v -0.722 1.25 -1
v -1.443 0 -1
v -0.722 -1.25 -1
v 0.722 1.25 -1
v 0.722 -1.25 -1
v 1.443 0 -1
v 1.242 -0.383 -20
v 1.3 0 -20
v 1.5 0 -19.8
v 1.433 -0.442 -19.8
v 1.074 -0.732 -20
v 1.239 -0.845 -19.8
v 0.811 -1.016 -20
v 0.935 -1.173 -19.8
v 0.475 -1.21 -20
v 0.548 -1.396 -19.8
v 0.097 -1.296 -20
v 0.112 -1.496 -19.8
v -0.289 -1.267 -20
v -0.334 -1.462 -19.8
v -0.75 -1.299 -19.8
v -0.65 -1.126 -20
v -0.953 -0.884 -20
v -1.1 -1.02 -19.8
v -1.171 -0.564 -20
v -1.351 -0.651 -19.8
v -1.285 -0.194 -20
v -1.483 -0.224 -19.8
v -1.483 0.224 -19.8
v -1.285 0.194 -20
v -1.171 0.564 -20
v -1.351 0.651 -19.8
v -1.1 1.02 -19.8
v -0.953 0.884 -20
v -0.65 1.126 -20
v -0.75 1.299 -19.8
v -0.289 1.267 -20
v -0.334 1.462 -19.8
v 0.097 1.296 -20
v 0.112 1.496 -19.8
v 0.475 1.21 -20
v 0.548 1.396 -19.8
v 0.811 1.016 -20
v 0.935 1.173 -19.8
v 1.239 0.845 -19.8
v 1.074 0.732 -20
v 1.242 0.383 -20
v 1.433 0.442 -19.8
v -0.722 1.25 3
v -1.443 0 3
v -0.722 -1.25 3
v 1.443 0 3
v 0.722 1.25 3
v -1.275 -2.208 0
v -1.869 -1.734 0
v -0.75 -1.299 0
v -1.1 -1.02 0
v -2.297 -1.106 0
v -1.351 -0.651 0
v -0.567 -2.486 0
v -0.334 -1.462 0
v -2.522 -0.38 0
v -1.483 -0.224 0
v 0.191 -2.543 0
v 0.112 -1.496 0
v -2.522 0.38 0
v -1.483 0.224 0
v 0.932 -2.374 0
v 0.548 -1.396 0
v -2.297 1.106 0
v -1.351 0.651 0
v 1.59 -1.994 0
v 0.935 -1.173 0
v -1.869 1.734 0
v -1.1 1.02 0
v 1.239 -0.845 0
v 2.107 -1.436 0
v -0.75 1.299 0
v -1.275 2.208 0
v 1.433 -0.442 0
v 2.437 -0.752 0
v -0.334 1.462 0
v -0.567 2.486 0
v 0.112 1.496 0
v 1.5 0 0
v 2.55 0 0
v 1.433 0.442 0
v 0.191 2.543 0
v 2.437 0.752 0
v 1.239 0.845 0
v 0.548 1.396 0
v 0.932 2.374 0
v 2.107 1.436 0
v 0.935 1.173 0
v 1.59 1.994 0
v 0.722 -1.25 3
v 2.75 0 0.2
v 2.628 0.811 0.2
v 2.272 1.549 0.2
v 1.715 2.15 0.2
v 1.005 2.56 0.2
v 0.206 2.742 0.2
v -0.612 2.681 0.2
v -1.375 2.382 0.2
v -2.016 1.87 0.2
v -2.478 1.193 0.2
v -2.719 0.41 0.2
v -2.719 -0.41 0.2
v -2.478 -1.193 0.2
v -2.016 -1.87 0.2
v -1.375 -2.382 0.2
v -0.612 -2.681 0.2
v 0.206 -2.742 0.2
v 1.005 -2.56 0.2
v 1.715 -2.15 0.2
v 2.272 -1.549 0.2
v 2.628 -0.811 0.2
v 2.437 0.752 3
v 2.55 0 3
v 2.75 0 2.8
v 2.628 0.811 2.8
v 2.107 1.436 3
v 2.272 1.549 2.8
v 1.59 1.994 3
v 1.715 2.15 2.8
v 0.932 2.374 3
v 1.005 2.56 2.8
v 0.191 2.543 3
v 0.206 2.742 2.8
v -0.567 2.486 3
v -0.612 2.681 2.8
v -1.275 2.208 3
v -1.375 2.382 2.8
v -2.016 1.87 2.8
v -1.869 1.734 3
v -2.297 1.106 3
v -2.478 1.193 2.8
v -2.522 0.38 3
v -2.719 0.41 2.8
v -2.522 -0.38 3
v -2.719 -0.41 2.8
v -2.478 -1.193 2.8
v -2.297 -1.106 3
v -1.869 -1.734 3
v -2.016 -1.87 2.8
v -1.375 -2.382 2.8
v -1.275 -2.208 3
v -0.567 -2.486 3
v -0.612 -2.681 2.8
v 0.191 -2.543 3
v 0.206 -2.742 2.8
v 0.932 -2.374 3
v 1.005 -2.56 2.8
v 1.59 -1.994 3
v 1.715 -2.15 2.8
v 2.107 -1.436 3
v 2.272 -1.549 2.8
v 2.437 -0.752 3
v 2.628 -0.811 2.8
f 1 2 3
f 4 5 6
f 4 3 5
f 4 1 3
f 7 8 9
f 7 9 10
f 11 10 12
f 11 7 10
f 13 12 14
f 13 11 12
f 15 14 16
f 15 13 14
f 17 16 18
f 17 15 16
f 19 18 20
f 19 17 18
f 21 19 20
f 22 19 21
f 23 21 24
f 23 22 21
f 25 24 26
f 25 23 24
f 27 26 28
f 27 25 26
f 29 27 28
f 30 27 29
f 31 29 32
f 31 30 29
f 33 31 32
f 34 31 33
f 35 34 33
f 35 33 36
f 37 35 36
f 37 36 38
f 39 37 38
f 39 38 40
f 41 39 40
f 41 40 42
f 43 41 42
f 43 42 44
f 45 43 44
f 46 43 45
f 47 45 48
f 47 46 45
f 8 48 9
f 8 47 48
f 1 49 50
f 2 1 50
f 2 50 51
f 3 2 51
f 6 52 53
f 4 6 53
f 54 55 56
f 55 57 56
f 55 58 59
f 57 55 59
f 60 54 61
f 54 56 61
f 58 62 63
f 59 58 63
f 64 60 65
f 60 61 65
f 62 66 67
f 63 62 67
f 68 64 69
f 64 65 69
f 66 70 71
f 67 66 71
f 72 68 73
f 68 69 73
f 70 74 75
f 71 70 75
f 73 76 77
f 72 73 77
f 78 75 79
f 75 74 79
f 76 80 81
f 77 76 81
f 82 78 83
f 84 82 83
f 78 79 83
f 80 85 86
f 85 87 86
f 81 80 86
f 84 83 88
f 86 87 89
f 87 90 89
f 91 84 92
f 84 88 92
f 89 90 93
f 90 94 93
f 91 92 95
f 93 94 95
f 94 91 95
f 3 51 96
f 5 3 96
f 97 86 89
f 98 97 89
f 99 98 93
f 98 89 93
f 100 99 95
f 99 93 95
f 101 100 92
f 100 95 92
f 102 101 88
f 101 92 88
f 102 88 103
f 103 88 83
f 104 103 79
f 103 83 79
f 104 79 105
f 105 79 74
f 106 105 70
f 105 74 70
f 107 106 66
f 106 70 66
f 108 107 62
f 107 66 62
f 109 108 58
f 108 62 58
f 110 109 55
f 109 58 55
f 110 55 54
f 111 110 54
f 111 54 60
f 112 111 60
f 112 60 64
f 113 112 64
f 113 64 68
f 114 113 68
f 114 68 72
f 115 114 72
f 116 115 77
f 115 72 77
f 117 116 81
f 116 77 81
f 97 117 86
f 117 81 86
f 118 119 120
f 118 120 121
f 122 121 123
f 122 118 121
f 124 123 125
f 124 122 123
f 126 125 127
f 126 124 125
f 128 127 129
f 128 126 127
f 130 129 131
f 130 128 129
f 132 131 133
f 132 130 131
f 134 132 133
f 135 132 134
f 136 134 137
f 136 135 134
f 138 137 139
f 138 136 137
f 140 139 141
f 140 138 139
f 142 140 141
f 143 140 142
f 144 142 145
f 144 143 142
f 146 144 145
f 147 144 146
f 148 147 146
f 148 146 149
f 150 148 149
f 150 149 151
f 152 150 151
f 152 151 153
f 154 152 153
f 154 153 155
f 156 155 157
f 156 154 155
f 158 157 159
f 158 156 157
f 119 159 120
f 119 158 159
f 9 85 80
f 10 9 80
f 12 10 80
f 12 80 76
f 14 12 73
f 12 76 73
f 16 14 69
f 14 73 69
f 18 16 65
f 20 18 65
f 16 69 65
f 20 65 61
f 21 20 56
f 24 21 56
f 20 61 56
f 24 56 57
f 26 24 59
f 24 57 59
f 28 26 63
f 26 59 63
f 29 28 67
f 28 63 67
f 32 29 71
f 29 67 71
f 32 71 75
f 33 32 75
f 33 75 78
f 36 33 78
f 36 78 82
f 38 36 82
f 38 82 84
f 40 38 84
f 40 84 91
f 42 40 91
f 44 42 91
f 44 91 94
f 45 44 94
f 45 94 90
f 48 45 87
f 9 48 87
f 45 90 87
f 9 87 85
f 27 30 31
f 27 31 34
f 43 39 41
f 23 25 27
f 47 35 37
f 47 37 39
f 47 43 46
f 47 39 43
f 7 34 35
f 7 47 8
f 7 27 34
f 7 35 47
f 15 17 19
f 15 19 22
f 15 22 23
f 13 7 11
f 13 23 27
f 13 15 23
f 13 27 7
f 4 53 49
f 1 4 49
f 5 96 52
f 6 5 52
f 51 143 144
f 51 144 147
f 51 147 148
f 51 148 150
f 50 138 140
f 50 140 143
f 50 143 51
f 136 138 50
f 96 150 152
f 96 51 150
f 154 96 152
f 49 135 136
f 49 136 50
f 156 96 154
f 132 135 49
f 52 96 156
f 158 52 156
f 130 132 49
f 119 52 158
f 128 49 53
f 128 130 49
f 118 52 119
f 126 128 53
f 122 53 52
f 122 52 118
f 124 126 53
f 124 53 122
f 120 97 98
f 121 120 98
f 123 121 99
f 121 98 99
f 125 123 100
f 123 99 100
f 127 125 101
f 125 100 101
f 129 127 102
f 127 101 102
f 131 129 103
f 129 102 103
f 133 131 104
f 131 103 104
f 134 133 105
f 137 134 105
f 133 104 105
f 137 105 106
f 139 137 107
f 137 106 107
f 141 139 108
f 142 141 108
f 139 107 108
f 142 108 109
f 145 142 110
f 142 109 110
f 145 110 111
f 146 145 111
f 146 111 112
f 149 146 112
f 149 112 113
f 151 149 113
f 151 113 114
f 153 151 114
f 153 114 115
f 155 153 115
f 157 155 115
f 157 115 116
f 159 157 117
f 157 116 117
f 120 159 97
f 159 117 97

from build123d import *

# Parameters (mm, degrees)
SKETCH006_R     = 2.75
PAD003_DEPTH    = 3
SKETCH007_R     = 1.5
PAD004_DEPTH    = 20
POCKET002_DEPTH = 4
CHAMFER004_SIZE = 0.2


with BuildPart() as part:
    # Sketch006 → Pad003 (new body)
    with BuildSketch(Plane.XY):
        Circle(SKETCH006_R)
    extrude(amount=PAD003_DEPTH)

    # Sketch007 (on Face2 of Pad003) → Pad004 (join)
    with BuildSketch(Plane(origin=(0, 0, 0), x_dir=(1, 0, 0), z_dir=(0, 0, -1))):
        Circle(SKETCH007_R)
    extrude(amount=PAD004_DEPTH)

    # Sketch008 (on DatumPlane) → Pocket002 (cut)
    with BuildSketch(Plane.XY.offset(3)):
        Polygon((0.721688, -1.25), (1.443376, 0), (0.721688, 1.25), (-0.721688, 1.25), (-1.443376, 0), (-0.721688, -1.25), align=None)
    extrude(amount=-POCKET002_DEPTH, mode=Mode.SUBTRACT)

    # Chamfer004
    chamfer004_edges = [part.edges().sort_by_distance(p)[0] for p in [
        (-1.5, 0, -20),
        (-2.75, 0, 0),
        (-2.75, 0, 3),
    ]]
    chamfer(chamfer004_edges, length=CHAMFER004_SIZE)


solid = part.part
